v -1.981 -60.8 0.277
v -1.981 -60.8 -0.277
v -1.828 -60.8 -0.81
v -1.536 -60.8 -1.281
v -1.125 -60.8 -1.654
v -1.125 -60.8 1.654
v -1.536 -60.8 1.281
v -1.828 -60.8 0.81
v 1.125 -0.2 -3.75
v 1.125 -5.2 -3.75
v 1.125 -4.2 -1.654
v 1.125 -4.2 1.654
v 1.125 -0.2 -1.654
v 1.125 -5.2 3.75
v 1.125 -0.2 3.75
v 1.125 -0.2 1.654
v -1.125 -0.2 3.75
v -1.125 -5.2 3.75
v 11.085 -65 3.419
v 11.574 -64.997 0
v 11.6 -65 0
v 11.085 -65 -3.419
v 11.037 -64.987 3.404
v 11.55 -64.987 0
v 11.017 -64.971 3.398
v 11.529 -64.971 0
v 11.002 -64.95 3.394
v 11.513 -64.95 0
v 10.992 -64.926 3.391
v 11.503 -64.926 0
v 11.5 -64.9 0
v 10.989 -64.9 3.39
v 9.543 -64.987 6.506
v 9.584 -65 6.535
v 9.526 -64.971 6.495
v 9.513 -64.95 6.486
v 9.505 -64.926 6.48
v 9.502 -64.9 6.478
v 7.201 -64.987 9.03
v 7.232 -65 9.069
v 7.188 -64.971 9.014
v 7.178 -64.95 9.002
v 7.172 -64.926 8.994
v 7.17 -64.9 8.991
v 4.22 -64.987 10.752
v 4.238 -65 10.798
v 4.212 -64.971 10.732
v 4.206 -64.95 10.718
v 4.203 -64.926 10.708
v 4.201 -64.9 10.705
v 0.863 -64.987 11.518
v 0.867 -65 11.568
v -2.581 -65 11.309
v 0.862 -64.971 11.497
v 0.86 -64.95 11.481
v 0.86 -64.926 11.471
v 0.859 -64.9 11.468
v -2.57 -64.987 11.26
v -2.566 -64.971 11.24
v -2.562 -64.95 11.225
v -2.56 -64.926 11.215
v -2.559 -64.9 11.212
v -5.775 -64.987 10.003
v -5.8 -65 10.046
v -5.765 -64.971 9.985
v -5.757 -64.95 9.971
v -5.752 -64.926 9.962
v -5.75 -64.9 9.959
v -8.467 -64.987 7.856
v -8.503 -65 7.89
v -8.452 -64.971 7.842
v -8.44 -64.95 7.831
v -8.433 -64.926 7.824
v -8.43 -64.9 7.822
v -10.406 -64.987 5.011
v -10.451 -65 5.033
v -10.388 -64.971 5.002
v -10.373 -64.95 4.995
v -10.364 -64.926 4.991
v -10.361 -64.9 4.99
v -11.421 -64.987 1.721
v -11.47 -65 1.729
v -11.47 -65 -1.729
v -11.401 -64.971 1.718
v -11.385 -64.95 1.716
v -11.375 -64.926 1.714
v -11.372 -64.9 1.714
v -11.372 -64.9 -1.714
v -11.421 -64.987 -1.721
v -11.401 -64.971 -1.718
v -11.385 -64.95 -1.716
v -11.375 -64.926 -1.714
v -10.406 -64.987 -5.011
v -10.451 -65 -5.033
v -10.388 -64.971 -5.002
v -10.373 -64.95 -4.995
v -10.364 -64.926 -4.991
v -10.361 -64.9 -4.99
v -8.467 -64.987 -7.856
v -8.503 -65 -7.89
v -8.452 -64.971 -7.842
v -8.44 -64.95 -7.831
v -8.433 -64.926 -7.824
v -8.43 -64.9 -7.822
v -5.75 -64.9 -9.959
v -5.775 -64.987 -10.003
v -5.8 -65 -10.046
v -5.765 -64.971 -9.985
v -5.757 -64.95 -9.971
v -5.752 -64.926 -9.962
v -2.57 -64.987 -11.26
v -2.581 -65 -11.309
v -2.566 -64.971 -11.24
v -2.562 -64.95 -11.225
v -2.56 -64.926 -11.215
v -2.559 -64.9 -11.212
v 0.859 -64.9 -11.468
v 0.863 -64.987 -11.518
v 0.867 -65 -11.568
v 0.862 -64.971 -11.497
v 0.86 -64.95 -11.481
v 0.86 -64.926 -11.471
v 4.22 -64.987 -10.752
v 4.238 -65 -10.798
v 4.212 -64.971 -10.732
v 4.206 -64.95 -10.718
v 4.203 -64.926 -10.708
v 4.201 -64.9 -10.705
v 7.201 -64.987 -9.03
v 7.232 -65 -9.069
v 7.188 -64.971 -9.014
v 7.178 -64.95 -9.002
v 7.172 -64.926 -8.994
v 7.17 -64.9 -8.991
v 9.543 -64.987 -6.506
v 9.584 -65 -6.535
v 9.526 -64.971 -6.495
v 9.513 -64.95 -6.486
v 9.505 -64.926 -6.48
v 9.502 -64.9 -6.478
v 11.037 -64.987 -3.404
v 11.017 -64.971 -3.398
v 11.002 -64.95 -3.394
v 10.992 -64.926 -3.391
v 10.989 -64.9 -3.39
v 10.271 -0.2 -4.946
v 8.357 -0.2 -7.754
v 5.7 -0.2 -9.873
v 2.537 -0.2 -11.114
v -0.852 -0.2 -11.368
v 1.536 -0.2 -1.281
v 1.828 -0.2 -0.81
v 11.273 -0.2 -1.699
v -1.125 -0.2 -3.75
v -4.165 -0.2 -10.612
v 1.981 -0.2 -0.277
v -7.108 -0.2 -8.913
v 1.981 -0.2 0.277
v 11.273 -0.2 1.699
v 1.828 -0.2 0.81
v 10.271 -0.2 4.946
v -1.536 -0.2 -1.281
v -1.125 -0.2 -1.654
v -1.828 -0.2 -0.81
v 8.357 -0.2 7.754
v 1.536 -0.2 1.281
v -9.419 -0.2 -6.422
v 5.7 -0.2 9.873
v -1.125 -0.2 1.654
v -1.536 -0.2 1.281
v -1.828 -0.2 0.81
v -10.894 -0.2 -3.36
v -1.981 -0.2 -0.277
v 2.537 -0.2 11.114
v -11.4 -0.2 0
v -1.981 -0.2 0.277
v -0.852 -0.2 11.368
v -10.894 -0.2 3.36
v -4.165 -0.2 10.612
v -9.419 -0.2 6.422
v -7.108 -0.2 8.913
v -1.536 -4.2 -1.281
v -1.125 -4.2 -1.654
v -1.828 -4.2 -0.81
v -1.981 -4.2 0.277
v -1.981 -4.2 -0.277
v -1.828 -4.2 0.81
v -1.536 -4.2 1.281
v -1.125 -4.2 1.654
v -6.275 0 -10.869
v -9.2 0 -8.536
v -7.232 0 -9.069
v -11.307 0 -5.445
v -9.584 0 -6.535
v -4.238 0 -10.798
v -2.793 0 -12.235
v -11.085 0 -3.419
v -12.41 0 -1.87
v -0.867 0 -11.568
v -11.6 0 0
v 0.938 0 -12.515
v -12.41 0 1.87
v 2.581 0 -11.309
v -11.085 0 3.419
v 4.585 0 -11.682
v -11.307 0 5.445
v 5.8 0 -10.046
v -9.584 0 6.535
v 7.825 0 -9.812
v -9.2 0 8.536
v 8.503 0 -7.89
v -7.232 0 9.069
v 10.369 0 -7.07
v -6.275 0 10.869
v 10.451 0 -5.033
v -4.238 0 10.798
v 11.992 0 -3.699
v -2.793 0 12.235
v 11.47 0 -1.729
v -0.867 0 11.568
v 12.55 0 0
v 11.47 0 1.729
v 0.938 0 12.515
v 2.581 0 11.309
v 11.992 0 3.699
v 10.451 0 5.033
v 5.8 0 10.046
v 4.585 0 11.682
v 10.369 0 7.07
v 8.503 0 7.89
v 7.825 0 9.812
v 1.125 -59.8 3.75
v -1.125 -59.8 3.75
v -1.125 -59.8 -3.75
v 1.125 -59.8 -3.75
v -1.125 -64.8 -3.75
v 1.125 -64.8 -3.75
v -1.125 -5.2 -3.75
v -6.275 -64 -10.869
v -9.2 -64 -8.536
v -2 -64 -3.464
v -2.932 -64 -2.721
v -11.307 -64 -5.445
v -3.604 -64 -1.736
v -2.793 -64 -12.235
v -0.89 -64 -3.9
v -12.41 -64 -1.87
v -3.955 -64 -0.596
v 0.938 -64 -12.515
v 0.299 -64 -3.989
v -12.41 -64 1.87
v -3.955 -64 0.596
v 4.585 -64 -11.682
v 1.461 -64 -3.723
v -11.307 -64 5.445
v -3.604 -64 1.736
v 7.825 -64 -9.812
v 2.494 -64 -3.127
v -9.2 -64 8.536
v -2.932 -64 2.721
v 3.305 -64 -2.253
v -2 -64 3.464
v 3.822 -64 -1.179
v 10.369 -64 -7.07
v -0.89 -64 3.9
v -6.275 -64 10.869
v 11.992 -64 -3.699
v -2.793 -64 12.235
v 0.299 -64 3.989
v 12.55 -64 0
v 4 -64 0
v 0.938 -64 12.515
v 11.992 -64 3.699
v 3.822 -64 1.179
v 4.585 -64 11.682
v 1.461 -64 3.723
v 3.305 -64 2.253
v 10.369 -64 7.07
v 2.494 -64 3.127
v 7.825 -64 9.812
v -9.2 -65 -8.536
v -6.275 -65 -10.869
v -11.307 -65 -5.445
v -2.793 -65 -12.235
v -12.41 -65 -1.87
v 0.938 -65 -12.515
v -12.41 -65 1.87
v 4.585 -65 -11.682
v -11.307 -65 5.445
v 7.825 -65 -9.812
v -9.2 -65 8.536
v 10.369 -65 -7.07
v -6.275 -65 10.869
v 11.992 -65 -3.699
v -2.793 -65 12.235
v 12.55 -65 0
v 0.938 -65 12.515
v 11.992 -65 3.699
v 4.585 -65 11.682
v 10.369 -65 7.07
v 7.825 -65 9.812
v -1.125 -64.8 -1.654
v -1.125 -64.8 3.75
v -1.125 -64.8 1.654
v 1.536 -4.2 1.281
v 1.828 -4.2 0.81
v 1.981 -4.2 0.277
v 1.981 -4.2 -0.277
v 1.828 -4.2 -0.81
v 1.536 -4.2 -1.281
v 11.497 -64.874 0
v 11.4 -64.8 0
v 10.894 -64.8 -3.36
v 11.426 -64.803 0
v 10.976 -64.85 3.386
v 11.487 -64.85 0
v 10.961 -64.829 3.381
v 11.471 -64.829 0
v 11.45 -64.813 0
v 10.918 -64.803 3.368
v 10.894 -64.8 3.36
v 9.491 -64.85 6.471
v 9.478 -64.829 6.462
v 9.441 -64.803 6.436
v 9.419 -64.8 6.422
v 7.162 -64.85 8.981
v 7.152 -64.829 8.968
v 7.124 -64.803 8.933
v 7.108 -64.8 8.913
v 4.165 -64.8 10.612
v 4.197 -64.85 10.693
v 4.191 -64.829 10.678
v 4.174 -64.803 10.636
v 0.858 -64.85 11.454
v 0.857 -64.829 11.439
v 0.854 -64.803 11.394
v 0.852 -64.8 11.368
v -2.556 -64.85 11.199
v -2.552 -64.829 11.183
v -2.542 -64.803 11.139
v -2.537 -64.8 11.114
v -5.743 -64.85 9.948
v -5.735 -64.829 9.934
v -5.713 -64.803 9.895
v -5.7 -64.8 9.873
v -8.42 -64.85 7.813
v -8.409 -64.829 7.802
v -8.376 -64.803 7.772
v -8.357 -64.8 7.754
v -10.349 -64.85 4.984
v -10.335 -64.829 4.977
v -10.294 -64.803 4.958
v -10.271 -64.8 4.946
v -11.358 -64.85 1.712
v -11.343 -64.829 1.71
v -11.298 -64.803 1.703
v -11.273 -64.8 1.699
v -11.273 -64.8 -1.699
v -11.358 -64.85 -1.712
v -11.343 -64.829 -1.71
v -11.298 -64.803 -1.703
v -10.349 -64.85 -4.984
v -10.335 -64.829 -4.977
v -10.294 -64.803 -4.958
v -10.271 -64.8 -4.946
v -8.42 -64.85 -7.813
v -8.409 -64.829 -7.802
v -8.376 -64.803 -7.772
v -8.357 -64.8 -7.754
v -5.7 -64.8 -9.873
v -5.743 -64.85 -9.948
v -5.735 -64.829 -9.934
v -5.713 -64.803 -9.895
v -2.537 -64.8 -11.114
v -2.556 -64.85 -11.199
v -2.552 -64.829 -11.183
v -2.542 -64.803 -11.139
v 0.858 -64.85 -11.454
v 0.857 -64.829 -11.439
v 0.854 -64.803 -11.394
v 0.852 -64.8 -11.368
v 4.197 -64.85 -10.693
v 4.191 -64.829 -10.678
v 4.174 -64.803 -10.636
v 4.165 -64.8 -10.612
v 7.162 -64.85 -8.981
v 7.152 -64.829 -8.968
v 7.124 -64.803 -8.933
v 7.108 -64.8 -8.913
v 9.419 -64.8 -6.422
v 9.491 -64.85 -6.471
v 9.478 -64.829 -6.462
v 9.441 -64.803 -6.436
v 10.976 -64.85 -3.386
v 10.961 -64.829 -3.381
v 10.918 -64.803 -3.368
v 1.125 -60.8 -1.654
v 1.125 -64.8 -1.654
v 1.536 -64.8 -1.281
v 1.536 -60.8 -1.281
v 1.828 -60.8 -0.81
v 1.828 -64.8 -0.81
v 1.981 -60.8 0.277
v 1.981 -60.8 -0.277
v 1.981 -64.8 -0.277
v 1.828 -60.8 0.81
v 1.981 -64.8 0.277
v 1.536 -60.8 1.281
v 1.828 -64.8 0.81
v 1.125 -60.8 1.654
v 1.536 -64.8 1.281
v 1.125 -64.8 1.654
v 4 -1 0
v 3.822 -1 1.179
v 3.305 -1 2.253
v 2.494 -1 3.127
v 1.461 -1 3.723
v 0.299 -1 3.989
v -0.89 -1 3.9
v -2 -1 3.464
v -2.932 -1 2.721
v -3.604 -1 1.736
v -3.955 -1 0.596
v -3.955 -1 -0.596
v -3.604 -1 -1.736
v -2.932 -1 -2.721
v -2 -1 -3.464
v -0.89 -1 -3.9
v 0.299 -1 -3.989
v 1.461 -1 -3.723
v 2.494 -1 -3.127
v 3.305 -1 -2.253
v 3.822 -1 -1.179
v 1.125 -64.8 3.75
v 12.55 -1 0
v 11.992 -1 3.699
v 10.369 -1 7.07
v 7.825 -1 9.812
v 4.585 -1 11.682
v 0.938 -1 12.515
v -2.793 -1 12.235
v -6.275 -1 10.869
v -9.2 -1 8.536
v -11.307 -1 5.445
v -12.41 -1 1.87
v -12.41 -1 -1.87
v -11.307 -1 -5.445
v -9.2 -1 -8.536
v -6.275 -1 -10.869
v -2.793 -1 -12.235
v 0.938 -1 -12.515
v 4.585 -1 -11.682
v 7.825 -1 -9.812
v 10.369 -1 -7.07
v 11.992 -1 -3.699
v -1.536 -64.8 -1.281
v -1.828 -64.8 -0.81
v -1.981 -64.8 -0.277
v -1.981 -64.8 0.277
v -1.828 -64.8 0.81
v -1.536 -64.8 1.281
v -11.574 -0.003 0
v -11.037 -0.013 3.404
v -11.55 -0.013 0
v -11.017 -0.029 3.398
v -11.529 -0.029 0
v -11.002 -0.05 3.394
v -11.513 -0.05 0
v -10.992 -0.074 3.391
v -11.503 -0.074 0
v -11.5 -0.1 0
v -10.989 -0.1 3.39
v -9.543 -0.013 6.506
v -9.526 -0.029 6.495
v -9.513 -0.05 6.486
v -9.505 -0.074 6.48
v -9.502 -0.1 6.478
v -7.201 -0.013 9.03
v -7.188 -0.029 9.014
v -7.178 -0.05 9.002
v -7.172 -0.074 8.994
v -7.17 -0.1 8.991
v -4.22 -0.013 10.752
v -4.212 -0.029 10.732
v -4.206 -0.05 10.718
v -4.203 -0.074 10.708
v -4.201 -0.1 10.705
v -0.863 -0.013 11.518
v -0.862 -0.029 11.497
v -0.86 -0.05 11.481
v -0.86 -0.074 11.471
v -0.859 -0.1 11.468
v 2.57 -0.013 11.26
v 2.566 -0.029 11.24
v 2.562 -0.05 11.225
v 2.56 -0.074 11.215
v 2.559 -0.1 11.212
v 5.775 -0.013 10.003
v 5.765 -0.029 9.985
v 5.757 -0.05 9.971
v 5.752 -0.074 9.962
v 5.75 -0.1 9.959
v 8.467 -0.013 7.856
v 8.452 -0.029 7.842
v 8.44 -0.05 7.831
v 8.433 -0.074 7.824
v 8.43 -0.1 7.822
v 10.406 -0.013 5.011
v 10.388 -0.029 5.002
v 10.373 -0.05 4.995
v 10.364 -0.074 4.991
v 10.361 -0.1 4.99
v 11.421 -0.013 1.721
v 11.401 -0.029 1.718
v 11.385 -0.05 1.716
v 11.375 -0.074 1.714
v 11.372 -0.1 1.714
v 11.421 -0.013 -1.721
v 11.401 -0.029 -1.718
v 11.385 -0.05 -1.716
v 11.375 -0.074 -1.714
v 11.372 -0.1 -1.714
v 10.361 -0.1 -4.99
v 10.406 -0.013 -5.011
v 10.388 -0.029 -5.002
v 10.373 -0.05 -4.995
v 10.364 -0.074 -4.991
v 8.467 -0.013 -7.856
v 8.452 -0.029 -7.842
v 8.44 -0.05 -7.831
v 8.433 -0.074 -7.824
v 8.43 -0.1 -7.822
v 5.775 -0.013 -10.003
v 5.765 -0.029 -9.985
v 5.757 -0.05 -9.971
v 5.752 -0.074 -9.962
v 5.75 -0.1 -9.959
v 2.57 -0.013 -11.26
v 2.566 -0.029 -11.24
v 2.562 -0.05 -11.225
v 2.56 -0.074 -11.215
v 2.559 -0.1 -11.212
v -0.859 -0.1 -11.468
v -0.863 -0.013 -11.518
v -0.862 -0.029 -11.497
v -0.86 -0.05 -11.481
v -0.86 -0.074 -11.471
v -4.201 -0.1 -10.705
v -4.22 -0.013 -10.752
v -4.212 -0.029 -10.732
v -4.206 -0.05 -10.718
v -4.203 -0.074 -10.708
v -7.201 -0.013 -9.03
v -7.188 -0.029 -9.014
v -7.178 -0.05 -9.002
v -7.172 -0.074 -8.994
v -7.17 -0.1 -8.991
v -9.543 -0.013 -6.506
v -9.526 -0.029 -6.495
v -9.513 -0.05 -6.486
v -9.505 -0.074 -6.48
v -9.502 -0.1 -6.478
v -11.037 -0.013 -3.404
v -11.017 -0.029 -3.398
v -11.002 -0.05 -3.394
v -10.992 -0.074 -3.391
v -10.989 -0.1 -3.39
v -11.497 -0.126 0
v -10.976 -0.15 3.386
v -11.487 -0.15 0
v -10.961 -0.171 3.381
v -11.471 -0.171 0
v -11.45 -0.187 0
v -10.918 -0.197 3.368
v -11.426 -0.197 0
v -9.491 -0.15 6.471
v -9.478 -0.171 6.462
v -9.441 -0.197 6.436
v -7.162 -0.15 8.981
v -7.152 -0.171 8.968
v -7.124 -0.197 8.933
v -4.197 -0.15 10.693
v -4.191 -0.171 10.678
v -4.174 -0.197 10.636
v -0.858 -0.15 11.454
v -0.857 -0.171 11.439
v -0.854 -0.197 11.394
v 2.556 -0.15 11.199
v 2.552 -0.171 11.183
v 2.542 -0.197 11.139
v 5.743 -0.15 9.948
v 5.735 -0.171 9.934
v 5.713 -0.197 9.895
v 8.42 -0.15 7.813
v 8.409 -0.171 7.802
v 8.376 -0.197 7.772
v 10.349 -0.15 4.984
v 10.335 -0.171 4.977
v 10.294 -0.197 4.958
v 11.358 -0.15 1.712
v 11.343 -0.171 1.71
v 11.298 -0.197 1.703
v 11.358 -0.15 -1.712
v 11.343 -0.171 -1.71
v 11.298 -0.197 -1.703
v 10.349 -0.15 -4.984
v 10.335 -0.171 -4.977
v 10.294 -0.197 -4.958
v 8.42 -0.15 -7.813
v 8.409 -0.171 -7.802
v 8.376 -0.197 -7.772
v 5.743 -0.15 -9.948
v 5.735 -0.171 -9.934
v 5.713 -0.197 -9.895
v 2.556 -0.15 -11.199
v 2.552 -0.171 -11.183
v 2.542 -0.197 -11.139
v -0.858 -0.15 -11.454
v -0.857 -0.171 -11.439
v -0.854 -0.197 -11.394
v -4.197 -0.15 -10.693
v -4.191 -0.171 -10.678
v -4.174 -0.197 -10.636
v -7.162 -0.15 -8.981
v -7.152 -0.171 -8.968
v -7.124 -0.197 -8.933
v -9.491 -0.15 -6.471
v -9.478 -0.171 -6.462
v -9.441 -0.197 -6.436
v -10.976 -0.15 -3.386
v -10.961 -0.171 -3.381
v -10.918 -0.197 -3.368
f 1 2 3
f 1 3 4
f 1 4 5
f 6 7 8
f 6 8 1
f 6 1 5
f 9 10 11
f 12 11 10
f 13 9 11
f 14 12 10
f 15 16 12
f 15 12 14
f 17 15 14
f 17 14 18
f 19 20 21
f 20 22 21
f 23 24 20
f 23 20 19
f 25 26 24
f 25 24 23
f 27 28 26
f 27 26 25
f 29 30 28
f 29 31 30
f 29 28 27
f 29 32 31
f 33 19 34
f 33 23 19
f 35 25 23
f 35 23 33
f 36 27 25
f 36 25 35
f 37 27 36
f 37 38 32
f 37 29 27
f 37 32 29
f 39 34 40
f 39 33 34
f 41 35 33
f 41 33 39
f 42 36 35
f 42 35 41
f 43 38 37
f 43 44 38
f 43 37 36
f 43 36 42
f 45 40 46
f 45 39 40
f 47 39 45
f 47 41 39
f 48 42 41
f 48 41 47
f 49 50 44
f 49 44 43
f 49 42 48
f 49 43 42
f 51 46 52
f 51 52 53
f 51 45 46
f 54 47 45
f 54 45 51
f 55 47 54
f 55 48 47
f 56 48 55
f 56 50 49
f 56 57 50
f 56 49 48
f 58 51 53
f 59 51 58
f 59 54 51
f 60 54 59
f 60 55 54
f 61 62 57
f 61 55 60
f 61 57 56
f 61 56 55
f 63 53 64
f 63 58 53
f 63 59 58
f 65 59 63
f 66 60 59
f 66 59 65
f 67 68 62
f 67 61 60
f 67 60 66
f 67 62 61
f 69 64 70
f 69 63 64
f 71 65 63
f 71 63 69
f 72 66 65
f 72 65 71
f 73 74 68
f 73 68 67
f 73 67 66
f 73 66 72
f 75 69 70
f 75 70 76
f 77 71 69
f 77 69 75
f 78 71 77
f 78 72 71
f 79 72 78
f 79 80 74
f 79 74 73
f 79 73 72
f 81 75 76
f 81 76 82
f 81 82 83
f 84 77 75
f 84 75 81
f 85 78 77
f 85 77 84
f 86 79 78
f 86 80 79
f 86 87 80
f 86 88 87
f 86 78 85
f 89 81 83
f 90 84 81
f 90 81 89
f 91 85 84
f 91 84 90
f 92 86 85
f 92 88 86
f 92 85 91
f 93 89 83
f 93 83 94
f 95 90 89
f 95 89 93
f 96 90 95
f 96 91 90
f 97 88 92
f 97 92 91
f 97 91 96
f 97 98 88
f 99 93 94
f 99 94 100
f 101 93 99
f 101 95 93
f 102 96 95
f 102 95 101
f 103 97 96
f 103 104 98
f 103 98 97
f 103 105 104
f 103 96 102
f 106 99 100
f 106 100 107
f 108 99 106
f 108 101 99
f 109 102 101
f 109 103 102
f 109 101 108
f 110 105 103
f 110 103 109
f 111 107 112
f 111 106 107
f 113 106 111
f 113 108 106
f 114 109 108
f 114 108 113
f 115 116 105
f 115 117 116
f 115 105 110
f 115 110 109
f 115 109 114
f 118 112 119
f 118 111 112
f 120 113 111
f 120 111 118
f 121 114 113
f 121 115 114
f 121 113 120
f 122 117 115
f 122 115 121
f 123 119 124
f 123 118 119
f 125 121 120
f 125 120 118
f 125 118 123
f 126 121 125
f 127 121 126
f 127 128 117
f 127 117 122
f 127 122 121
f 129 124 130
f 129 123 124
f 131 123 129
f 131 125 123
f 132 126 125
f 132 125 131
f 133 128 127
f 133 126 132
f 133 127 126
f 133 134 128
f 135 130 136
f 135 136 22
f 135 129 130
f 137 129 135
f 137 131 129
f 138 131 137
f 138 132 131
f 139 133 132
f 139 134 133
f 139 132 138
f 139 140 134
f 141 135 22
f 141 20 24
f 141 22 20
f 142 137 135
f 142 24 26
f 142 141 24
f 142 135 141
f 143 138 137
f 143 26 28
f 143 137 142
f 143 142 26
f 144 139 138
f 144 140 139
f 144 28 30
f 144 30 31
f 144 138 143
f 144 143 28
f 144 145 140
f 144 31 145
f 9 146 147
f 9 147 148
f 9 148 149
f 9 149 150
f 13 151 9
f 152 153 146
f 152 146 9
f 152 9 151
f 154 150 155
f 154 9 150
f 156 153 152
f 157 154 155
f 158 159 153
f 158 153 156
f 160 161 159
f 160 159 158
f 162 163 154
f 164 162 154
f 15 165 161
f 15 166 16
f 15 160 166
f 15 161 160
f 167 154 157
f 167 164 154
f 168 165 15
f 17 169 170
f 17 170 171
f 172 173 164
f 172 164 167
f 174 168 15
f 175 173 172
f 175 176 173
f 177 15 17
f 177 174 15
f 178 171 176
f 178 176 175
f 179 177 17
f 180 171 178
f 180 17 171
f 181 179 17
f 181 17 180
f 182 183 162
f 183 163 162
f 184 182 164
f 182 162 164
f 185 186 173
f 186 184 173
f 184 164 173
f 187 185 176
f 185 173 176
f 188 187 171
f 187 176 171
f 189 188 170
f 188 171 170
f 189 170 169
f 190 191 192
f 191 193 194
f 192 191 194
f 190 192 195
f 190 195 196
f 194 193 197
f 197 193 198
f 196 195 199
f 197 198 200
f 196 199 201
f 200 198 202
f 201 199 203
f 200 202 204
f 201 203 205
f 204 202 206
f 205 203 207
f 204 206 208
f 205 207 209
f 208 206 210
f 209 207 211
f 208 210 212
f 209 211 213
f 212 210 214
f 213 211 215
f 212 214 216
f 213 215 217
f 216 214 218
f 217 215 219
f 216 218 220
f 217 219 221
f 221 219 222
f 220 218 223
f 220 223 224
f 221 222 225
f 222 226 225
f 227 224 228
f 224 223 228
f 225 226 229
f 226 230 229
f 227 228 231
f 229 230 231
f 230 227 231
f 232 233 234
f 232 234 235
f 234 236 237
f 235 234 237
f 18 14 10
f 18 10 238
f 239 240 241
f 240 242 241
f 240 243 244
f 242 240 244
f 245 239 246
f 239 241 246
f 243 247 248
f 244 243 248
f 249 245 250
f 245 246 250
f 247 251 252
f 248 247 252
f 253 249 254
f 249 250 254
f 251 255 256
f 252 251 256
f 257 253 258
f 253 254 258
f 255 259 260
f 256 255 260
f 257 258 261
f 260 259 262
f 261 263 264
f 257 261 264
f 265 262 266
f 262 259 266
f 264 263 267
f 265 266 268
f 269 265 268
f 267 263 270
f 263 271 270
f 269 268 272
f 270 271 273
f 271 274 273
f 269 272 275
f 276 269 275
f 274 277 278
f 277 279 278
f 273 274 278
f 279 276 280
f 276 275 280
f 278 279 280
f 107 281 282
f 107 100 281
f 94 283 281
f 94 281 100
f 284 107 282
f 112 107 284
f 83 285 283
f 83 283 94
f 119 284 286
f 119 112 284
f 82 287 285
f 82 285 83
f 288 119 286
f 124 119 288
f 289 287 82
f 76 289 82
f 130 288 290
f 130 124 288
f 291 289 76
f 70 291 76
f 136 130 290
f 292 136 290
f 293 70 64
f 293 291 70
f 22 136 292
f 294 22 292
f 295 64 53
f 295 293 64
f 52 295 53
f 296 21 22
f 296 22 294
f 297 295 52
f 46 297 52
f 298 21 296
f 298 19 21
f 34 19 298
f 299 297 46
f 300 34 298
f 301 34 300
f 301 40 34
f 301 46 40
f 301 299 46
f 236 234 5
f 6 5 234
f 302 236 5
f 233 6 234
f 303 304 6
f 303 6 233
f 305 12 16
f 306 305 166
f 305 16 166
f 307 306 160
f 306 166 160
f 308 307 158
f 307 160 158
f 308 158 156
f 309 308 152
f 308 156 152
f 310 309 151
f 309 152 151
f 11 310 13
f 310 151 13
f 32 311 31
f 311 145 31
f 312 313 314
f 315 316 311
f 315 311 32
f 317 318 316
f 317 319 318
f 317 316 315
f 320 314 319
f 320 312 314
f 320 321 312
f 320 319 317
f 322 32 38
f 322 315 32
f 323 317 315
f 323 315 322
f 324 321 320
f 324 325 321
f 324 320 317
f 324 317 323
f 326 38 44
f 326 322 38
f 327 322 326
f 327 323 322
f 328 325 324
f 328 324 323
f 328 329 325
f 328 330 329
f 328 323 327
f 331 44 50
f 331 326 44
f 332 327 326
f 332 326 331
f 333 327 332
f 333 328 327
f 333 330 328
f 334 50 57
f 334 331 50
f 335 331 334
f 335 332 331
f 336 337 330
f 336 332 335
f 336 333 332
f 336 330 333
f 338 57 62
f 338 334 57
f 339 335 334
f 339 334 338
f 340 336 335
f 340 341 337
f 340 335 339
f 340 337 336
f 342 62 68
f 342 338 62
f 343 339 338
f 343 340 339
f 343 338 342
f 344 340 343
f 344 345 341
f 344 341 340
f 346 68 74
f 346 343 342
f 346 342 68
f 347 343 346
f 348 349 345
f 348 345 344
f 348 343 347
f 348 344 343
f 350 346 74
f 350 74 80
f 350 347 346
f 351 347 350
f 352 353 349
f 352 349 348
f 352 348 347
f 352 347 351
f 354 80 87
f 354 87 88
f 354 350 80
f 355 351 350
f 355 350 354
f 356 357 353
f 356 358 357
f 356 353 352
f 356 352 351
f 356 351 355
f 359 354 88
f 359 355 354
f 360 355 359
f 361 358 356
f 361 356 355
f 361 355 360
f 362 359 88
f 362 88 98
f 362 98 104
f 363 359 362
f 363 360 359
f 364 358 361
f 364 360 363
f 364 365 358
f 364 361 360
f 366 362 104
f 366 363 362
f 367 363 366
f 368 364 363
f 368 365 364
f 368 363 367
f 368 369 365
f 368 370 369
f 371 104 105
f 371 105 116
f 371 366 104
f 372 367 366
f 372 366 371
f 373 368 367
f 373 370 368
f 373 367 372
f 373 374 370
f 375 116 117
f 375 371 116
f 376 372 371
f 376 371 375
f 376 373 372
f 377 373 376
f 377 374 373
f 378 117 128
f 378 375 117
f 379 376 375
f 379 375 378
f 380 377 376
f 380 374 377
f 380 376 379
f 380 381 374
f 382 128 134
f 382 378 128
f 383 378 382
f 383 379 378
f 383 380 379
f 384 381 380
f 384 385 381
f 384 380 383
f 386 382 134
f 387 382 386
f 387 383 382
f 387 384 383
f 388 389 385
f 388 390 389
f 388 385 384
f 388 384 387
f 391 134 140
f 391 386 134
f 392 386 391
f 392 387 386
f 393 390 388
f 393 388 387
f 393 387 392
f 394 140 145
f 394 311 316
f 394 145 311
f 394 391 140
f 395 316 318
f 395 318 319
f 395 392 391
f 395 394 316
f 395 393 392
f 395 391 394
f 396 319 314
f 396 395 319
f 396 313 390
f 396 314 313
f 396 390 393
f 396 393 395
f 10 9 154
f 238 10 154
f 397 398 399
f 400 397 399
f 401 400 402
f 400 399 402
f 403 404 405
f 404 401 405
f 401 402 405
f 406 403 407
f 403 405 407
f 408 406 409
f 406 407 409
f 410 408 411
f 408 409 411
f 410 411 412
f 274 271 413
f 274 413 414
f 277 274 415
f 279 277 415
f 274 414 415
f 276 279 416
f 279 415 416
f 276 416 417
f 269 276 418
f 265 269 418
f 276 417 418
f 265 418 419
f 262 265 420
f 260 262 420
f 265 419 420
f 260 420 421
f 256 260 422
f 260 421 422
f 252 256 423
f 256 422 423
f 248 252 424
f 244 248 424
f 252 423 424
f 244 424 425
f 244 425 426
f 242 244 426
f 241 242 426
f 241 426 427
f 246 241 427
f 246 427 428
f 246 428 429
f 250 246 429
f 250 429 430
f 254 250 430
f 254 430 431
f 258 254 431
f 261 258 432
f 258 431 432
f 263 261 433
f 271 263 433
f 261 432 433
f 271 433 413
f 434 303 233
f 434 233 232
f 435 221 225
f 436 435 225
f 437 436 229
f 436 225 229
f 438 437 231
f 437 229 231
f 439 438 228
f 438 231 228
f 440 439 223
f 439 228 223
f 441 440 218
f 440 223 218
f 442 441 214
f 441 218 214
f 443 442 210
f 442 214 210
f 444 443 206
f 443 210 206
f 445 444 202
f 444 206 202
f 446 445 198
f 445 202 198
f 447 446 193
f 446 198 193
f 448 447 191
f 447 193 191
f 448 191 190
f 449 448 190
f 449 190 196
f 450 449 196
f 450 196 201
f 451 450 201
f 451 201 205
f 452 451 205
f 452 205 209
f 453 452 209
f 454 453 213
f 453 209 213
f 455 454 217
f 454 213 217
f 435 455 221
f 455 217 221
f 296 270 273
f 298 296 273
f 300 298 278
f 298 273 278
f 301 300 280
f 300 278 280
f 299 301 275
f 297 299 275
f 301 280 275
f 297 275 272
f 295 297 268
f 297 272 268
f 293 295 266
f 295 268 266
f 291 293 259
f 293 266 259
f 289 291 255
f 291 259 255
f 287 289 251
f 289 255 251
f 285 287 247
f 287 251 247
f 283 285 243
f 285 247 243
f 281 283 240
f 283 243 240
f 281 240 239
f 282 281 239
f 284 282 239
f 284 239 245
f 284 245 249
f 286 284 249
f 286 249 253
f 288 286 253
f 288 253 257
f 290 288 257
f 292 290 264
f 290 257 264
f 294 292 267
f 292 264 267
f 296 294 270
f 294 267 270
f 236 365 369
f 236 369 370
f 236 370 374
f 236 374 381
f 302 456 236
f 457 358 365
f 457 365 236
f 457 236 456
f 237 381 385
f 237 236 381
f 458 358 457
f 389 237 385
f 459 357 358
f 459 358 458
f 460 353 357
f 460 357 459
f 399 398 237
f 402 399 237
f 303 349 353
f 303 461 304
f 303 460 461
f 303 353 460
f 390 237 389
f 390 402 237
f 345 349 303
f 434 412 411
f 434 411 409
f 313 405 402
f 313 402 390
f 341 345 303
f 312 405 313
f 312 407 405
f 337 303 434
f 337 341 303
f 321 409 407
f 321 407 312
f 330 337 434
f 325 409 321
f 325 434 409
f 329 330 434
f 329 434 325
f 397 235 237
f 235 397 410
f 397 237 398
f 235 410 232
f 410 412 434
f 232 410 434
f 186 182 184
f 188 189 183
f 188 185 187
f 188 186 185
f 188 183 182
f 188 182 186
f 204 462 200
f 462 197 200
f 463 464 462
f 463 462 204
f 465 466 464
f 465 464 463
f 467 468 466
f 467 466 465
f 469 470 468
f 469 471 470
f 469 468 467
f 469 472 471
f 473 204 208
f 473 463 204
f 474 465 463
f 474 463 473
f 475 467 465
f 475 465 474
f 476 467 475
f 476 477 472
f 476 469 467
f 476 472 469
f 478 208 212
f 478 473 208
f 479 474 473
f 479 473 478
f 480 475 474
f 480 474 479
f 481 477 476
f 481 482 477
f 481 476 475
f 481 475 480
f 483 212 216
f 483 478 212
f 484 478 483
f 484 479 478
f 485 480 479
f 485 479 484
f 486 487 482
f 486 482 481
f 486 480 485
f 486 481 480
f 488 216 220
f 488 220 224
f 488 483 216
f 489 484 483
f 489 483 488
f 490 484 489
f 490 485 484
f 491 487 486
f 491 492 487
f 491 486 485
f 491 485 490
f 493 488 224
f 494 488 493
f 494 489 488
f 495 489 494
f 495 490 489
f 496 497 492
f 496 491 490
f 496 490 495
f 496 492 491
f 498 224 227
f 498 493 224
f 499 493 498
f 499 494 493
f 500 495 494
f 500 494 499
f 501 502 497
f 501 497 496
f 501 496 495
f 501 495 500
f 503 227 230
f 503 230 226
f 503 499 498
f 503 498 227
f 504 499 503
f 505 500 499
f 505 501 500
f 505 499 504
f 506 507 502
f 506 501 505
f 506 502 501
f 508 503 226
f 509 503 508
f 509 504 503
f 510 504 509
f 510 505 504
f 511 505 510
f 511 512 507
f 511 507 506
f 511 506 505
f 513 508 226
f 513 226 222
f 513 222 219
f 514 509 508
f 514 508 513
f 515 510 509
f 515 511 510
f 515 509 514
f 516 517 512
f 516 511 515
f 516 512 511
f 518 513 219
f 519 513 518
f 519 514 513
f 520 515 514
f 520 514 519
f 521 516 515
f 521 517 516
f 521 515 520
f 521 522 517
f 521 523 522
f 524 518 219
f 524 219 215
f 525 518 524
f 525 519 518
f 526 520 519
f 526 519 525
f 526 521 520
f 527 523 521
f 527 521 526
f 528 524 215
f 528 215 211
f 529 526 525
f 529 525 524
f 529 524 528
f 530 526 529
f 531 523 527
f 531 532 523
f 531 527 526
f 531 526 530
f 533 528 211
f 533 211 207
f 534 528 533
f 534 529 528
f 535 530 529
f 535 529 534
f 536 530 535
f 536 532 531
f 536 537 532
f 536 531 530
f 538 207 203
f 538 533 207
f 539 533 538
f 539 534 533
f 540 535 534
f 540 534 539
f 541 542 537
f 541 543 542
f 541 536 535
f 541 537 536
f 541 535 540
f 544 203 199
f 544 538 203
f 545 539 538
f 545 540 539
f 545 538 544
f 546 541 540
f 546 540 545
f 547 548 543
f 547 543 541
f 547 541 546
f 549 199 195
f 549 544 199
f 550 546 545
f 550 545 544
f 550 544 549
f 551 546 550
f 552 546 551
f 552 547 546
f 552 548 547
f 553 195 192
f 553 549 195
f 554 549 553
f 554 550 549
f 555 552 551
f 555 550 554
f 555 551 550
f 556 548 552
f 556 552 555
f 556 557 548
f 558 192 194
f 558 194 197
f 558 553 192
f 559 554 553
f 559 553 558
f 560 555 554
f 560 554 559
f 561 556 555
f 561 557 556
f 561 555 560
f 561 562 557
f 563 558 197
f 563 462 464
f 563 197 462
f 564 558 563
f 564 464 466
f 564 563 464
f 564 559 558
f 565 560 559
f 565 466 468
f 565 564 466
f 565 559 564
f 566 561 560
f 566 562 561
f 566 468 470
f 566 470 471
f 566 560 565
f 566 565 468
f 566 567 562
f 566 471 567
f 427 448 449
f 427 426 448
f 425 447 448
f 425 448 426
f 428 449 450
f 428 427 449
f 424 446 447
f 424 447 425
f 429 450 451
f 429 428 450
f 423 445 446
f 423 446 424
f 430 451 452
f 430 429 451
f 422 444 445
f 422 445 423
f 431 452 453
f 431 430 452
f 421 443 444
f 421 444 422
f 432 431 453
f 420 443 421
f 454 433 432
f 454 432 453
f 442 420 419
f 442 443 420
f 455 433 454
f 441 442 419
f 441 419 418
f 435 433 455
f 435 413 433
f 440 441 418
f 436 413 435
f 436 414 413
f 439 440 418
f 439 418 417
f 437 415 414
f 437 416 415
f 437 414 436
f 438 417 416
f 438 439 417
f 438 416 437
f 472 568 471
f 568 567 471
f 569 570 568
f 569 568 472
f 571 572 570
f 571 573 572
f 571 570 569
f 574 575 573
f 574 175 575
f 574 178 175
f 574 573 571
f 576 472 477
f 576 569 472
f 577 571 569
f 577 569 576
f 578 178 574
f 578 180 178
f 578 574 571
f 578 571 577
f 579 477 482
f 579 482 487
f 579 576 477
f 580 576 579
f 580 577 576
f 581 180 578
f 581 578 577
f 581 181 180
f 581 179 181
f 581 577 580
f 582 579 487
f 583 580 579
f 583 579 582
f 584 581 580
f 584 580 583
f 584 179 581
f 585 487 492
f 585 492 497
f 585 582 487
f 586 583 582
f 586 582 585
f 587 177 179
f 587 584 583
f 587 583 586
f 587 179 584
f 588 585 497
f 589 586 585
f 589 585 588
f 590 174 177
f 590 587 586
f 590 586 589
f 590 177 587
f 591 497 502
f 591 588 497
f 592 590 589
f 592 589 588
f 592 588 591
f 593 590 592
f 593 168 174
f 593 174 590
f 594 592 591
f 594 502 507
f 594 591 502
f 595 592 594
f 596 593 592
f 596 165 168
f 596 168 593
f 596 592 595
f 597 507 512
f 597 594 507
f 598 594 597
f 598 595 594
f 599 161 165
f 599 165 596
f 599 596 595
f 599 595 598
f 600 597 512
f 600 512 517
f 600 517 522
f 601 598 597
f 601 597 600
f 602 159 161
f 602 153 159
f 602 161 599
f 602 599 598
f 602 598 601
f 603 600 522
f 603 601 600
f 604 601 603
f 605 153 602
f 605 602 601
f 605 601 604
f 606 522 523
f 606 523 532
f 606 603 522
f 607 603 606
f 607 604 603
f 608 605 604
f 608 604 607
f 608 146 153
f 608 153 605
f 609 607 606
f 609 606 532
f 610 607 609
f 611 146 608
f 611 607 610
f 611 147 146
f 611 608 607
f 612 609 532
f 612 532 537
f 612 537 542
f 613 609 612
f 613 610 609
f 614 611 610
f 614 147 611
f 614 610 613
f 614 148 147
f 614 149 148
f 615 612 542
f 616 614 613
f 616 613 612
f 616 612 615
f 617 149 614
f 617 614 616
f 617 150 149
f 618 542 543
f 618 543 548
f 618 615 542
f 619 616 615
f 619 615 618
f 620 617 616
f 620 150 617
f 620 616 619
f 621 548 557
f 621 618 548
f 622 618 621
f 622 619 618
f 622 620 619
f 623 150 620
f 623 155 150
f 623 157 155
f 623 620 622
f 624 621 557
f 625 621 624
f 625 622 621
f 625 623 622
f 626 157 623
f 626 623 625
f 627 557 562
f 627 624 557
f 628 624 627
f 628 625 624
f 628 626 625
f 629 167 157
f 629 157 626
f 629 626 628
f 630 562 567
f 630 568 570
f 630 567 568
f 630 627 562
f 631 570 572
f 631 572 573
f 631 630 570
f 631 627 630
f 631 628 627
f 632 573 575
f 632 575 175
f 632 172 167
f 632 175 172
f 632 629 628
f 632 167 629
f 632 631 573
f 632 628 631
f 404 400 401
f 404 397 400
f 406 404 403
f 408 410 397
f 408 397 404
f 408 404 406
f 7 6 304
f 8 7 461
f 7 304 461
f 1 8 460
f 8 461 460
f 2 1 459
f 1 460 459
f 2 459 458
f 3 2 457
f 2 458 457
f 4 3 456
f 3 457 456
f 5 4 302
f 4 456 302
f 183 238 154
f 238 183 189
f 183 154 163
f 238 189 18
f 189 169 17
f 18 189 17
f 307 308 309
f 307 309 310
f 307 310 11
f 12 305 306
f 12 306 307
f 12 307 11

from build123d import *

# Parameters (mm, degrees)
F0_R      = 12.55
F1_DEPTH  = 1
F2_R      = 4
F3_DEPTH  = 63
F4_R      = 12.55
F5_DEPTH  = 1
F6_R      = 11.5
F7_DEPTH  = 0.2
F8_R      = 0.09999
F9_R      = 2
F10_DEPTH = 4
F11_W     = 2.25
F11_H     = 7.5
F12_DEPTH = 5
F13_R     = 11.5
F14_DEPTH = 0.2
F15_R     = 0.09999
F16_R     = 2
F17_DEPTH = 4
F18_W     = 2.25
F18_H     = 7.5
F19_DEPTH = 5


# Not quite as in the source:
# - a fillet or chamfer is up to 0.001 mm smaller than in the source, because OpenCascade refuses the exact size


with BuildPart() as f1:
    # F0 (on Front) → F1 (new body)
    with BuildSketch(Plane.XZ):
        Circle(F0_R)
    extrude(amount=F1_DEPTH)

    # F2 (on face) → F3 (join)
    with BuildSketch(Plane.XZ.offset(1)):
        Circle(F2_R)
    extrude(amount=F3_DEPTH)

    # F4 (on face) → F5 (join)
    with BuildSketch(Plane.XZ.offset(64)):
        Circle(F4_R)
    extrude(amount=F5_DEPTH)

    # F6 (on face) → F7 (cut)
    with BuildSketch(Plane.XZ.offset(65)):
        Circle(F6_R)
    extrude(amount=-F7_DEPTH, mode=Mode.SUBTRACT)

    # F8 (radius 0.1 in the source; OpenCascade refuses exactly that, so slightly less here)
    f8_edges = [f1.edges().sort_by_distance(p)[0] for p in [
        (-11.5, -65, 0),
        (11.5, -64.9, 0),
        (-11.5, -64.8, 0),
    ]]
    fillet(f8_edges, radius=F8_R)

    # F9 (on face) → F10 (cut)
    with BuildSketch(Plane.XZ.offset(64.8)):
        Circle(F9_R)
    extrude(amount=-F10_DEPTH, mode=Mode.SUBTRACT)

    # F11 (on face) → F12 (cut)
    with BuildSketch(Plane(origin=(0, -0.2, 0), x_dir=(-1, 0, 0), z_dir=(0, 1, 0))):
        Rectangle(F11_W, F11_H)
    extrude(amount=-F12_DEPTH, mode=Mode.SUBTRACT)

    # F13 (on face) → F14 (cut)
    with BuildSketch(Plane(origin=(0, 0, 0), x_dir=(-1, 0, 0), z_dir=(0, 1, 0))):
        Circle(F13_R)
    extrude(amount=-F14_DEPTH, mode=Mode.SUBTRACT)

    # F15 (radius 0.1 in the source; OpenCascade refuses exactly that, so slightly less here)
    f15_edges = [f1.edges().sort_by_distance(p)[0] for p in [
        (11.5, 0, 0),
        (11.5, -0.2, 0),
    ]]
    fillet(f15_edges, radius=F15_R)

    # F16 (on face) → F17 (cut)
    with BuildSketch(Plane(origin=(0, -0.2, 0), x_dir=(-1, 0, 0), z_dir=(0, 1, 0))):
        Circle(F16_R)
    extrude(amount=-F17_DEPTH, mode=Mode.SUBTRACT)

    # F18 (on face) → F19 (cut)
    with BuildSketch(Plane.XZ.offset(64.8)):
        Rectangle(F18_W, F18_H)
    extrude(amount=-F19_DEPTH, mode=Mode.SUBTRACT)


solid = f1.part
